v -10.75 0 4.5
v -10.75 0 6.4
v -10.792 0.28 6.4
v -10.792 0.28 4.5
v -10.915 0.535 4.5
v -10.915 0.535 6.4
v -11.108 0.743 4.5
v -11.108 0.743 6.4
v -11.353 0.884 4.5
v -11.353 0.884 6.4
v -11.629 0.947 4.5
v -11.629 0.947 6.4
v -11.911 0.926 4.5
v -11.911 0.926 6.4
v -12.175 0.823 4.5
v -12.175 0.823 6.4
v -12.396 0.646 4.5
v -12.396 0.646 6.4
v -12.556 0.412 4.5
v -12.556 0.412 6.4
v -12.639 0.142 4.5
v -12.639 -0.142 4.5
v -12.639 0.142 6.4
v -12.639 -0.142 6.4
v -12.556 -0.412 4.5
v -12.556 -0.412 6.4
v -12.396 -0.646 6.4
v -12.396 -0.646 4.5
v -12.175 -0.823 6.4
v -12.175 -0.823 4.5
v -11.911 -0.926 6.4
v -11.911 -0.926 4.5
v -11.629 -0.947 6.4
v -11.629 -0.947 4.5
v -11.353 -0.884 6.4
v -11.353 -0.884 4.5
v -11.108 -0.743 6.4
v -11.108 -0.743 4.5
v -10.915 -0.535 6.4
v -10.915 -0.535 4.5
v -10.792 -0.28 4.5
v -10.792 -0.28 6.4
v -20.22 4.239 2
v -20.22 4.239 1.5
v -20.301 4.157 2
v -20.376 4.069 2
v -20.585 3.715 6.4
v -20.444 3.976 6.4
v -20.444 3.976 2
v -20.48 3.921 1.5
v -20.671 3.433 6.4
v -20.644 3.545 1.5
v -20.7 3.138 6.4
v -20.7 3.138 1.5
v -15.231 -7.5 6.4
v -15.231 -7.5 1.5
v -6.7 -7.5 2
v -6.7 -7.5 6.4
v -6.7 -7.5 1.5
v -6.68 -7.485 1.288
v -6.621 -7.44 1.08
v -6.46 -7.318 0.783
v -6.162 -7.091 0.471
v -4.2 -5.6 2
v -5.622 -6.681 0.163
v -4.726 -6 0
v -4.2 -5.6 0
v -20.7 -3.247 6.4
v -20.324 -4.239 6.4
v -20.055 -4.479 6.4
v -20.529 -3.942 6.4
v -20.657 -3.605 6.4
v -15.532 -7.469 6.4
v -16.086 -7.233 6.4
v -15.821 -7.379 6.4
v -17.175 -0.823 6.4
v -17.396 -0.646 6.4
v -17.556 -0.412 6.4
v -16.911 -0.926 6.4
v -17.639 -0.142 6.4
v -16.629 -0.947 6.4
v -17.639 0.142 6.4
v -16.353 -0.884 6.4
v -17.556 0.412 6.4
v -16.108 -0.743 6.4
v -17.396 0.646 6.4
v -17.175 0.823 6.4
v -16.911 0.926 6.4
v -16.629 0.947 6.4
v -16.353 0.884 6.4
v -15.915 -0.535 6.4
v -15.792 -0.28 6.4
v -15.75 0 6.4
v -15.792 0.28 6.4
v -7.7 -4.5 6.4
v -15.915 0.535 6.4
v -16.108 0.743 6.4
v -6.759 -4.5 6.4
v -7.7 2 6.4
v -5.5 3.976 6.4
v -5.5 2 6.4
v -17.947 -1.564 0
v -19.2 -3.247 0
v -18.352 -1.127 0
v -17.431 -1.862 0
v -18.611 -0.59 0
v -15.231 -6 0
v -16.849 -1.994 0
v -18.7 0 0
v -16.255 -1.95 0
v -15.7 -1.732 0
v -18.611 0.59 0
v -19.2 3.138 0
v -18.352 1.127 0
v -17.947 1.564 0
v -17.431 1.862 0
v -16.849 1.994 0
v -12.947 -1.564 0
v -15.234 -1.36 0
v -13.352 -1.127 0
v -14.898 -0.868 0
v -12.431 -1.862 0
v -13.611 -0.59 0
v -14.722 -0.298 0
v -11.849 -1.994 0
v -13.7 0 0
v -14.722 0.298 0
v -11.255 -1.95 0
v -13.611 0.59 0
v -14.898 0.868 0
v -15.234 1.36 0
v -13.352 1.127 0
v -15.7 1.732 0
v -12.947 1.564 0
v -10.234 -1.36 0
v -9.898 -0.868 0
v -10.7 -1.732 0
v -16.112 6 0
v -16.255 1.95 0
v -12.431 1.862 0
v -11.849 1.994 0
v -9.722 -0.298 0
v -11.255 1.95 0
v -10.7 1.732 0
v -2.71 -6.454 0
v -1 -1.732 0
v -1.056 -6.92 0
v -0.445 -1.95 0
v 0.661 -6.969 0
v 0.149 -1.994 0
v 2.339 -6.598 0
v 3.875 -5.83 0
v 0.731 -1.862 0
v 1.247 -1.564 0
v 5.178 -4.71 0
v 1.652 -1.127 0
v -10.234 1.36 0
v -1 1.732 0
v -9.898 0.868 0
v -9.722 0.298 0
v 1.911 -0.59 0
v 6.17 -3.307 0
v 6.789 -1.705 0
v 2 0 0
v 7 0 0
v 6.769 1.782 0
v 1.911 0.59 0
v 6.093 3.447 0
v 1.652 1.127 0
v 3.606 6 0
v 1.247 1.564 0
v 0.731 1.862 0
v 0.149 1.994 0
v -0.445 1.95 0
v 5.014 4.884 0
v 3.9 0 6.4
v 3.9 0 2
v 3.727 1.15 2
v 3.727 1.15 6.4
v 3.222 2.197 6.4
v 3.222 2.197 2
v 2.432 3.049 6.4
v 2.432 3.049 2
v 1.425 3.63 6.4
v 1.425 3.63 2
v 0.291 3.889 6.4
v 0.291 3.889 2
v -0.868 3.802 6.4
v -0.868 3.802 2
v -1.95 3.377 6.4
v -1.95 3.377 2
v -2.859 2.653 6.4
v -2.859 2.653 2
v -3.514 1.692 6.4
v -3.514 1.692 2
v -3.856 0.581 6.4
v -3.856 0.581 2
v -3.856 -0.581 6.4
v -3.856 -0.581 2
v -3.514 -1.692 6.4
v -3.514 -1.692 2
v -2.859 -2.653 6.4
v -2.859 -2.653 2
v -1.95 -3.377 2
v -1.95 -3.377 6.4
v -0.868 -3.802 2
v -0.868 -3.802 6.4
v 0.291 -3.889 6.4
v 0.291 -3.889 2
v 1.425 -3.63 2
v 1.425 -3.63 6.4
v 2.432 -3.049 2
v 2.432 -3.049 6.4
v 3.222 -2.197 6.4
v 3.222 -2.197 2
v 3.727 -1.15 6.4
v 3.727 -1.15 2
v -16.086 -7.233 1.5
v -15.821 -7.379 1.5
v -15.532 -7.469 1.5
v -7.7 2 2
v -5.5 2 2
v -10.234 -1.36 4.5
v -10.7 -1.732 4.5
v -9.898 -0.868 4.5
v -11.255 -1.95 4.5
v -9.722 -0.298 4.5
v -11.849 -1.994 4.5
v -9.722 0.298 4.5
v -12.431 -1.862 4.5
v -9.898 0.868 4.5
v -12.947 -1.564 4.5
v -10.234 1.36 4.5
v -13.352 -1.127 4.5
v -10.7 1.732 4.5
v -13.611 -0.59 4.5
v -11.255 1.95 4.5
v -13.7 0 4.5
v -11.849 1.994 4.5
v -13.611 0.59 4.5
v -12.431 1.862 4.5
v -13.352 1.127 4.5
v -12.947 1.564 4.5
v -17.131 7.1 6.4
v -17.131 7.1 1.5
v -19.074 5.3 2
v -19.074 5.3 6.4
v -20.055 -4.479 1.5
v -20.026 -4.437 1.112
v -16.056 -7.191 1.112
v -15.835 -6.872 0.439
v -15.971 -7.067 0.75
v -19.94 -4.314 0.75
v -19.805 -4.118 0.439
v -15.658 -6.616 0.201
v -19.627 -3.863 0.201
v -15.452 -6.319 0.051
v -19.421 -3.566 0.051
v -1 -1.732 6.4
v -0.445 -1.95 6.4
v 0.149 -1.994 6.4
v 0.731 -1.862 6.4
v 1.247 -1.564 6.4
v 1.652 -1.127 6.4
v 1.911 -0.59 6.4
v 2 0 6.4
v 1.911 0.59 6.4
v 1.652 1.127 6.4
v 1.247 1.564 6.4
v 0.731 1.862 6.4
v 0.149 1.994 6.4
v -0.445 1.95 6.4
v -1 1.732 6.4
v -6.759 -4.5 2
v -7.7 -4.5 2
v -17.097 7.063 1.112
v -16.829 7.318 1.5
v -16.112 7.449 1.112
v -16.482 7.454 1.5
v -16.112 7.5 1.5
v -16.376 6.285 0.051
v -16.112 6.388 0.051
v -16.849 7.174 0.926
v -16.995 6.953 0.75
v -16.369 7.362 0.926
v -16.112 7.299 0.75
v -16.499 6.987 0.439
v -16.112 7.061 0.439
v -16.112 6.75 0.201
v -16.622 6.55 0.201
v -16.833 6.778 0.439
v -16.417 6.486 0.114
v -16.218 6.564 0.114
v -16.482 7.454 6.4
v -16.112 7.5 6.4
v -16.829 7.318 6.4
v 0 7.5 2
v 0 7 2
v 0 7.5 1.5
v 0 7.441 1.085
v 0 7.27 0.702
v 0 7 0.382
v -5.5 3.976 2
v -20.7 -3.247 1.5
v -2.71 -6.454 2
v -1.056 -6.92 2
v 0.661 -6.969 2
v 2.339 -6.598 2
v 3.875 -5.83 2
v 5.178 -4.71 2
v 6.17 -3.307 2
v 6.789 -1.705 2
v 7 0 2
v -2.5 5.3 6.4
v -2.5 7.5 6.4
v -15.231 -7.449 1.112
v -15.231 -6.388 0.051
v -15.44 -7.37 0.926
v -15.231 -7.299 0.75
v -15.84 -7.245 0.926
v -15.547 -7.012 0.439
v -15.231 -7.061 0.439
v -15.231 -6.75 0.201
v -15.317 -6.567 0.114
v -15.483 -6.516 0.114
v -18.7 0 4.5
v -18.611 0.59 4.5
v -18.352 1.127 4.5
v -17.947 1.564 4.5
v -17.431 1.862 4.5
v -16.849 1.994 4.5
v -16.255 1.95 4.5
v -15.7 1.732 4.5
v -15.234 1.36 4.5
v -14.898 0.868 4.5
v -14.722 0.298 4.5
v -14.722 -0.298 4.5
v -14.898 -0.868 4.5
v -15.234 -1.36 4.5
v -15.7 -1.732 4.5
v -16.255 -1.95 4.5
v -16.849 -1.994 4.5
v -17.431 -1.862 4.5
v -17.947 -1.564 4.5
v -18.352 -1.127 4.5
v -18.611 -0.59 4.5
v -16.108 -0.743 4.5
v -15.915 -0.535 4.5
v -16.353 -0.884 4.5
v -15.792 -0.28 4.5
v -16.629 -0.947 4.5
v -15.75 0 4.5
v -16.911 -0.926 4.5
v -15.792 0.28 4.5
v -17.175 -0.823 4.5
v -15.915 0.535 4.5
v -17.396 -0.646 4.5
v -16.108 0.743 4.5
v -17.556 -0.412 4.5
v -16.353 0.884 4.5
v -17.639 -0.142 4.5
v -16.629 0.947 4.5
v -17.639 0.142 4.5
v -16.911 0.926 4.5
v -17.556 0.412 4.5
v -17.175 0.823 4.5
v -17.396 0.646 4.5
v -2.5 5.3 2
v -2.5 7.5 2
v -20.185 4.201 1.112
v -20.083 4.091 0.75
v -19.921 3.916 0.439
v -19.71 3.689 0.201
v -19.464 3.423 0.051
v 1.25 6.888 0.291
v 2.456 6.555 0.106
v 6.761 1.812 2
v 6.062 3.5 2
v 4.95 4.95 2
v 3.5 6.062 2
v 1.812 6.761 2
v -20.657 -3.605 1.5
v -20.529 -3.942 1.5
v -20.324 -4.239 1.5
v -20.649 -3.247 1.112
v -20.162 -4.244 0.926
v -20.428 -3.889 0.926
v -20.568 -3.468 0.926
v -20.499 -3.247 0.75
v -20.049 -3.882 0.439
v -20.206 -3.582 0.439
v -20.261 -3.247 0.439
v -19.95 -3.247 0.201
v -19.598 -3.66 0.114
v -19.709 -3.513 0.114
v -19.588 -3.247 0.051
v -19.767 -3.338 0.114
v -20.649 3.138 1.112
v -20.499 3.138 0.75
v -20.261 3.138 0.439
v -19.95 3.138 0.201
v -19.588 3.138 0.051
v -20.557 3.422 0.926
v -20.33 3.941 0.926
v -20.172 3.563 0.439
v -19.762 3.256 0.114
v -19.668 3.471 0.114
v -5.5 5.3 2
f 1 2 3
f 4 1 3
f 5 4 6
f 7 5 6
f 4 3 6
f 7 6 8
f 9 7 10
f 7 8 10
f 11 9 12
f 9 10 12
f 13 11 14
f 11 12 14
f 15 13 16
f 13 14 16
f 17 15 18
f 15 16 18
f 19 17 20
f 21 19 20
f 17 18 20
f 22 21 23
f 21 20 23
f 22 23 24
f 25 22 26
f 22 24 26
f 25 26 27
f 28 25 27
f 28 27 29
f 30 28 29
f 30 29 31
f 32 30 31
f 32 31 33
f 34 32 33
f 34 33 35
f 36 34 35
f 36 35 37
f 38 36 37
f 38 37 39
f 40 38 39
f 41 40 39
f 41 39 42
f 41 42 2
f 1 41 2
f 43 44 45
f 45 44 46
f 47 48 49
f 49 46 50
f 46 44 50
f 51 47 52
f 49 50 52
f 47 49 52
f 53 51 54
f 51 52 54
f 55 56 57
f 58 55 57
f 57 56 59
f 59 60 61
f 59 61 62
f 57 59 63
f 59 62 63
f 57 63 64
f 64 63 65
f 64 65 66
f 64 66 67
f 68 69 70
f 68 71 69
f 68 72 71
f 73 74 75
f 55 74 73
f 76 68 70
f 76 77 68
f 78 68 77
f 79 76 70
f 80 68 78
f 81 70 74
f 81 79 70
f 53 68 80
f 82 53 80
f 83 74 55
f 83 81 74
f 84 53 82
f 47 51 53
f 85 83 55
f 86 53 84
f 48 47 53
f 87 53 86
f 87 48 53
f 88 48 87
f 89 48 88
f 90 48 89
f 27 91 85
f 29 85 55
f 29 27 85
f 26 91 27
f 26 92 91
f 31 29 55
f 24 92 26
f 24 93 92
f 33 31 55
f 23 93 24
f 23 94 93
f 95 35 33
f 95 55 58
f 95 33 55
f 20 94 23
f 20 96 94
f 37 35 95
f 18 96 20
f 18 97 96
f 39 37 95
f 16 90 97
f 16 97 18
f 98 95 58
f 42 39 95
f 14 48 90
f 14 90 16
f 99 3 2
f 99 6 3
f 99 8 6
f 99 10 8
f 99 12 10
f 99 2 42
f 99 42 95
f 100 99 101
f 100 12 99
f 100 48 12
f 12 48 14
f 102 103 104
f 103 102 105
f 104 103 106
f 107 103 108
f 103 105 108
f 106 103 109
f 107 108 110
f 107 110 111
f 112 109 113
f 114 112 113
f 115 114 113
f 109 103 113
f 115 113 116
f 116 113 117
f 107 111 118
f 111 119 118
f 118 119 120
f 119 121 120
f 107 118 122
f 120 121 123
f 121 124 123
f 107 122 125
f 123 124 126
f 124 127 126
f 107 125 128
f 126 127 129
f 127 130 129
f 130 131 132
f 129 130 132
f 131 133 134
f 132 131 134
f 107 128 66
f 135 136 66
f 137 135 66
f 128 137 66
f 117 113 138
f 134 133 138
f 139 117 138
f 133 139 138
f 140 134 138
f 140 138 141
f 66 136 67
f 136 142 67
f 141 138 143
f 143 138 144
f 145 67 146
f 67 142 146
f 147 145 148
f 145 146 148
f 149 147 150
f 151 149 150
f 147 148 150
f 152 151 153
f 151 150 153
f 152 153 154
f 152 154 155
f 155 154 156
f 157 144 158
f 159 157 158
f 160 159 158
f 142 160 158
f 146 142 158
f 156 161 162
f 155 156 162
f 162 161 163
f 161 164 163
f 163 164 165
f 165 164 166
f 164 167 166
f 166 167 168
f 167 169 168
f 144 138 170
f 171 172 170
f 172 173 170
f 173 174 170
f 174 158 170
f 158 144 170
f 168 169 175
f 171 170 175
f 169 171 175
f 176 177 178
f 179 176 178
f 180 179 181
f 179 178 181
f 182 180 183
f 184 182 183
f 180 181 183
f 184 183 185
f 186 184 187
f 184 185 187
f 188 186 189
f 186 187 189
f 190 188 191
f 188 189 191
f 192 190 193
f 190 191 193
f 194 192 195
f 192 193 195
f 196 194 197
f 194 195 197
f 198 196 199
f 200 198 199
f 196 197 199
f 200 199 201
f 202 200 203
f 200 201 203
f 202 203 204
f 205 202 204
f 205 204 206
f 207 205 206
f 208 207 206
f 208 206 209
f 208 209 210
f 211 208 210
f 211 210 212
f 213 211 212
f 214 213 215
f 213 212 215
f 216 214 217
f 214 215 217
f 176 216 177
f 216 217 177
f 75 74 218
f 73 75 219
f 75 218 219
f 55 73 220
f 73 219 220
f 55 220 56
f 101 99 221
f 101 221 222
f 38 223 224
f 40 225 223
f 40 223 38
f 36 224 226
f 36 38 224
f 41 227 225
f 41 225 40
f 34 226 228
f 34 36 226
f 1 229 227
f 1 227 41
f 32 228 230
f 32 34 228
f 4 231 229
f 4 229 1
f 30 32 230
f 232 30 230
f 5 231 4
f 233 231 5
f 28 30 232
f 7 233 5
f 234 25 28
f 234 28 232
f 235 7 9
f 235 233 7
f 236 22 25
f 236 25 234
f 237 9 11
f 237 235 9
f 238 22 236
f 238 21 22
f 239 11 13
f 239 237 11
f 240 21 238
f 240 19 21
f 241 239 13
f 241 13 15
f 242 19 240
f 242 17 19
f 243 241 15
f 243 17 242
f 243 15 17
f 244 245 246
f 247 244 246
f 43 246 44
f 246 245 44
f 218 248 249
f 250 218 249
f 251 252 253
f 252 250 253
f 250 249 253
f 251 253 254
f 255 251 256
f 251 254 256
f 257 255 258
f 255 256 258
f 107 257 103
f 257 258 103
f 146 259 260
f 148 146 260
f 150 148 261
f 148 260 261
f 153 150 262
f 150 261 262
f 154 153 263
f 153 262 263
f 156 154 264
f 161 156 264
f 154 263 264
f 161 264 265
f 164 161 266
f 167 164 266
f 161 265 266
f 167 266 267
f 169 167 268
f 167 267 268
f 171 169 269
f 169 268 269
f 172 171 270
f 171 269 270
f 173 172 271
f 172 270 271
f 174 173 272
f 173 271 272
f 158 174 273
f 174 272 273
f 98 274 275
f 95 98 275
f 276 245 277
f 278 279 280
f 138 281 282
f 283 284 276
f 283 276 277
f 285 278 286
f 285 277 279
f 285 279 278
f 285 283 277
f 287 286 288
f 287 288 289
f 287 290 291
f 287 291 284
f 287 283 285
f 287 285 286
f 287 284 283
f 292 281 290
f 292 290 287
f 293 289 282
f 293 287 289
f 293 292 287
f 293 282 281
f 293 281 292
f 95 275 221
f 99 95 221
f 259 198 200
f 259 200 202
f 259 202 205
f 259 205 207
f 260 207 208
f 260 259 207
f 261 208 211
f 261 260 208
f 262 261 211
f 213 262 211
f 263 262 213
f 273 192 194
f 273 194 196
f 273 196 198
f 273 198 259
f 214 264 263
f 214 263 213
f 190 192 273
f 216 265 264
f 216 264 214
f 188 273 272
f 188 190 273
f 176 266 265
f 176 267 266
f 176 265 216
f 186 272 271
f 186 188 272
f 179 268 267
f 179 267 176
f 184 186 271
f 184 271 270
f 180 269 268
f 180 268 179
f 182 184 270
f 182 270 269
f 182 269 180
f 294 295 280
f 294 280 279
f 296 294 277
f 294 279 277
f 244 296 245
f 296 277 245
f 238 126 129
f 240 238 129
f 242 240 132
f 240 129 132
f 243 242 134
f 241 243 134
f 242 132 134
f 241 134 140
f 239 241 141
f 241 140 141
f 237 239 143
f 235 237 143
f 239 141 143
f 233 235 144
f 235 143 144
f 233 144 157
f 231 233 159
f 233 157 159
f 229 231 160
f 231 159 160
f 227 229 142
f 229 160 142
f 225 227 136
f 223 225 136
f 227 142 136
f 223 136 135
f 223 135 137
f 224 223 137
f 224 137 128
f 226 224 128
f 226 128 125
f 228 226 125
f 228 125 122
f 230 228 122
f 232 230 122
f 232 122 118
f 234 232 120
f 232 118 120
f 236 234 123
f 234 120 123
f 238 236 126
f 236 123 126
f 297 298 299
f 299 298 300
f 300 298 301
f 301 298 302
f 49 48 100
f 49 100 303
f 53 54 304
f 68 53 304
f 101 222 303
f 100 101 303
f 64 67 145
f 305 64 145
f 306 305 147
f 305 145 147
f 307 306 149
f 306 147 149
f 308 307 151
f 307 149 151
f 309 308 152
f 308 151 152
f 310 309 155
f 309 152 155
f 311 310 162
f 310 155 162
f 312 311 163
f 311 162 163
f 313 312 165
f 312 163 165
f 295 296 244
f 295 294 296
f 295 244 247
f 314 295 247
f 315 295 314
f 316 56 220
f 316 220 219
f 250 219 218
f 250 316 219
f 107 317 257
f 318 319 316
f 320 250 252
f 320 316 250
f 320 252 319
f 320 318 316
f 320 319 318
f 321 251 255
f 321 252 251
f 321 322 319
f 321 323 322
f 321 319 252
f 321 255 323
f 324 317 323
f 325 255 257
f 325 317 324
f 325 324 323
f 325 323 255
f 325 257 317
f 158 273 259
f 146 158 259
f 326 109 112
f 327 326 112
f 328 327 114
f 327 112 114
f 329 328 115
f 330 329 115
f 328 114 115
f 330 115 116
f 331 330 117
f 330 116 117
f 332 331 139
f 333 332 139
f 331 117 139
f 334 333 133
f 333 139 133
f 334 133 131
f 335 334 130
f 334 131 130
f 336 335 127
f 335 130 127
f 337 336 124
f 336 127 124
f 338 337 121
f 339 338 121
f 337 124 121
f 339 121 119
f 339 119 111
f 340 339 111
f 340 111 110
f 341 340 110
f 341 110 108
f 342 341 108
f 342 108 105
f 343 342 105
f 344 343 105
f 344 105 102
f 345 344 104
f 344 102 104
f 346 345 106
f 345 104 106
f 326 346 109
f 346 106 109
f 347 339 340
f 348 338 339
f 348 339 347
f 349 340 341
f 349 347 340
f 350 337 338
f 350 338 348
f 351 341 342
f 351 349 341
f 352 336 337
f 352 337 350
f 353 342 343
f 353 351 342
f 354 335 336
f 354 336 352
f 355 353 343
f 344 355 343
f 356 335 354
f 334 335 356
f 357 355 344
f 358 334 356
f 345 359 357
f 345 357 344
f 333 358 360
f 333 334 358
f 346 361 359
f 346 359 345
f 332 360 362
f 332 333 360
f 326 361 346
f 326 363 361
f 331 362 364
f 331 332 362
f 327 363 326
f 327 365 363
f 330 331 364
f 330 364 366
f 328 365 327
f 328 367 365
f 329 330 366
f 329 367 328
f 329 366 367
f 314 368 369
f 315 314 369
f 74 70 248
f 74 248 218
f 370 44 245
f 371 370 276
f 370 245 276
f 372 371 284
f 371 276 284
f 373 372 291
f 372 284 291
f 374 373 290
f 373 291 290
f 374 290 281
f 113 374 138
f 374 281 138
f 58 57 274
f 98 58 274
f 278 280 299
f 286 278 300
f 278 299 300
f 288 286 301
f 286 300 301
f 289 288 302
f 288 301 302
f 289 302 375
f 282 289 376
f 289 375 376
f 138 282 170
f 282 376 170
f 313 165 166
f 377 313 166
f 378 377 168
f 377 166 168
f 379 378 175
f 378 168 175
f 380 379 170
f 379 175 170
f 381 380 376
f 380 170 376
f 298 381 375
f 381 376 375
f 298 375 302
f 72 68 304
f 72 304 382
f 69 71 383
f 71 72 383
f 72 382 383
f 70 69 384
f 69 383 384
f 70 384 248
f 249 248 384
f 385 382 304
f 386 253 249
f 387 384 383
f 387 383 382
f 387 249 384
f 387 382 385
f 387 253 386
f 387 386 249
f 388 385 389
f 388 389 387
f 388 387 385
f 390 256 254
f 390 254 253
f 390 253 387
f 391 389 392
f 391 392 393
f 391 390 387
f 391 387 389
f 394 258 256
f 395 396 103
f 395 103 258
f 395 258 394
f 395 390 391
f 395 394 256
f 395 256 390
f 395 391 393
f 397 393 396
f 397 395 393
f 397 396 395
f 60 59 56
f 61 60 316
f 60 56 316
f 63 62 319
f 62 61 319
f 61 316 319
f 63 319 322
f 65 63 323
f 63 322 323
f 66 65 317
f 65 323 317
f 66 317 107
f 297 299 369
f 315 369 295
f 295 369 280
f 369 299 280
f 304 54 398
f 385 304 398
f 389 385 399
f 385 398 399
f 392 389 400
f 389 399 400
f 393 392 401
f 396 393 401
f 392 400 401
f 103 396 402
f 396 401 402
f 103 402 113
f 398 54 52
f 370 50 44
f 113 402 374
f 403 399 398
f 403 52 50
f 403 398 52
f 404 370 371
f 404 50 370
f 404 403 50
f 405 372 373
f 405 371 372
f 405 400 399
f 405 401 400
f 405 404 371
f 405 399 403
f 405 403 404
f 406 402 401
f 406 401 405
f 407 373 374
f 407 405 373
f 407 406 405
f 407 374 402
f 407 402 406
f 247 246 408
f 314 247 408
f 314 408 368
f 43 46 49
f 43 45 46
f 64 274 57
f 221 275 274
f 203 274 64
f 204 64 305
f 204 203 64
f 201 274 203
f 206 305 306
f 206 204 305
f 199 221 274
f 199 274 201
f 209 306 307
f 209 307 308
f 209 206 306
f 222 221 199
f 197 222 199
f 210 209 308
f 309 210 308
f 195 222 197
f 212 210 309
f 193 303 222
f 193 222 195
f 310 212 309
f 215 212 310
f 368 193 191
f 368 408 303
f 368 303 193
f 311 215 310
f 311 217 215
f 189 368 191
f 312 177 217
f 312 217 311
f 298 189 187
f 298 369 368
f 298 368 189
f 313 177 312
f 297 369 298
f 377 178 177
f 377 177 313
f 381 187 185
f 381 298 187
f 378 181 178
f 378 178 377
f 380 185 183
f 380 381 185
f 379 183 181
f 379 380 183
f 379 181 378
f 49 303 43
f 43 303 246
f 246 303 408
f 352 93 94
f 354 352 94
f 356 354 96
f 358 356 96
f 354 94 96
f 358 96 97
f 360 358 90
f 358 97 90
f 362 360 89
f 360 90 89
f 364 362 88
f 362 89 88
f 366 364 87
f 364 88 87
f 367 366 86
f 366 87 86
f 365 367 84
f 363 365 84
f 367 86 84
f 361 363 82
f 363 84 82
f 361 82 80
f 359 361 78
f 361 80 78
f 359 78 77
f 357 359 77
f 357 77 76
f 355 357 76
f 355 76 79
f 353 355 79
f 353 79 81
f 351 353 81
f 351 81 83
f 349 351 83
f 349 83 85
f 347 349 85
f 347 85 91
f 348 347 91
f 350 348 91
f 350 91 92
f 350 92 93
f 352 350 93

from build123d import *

# Parameters (mm, degrees)
BOSS_EXTRUDE1_DEPTH      = 2
BOSS_EXTRUDE2_DEPTH      = 8
SKETCH24_R               = 3.9
BOSS_EXTRUDE5_DEPTH      = 4.4
SKETCH30_W               = 4.40861202
SKETCH30_H               = 1.324178481
CUT_EXTRUDE12_DEPTH      = 16
CUT_EXTRUDE11_DEPTH      = 23.928148639
FILLET1_R                = 1.5
SKETCH34_R               = 0.75
CUT_EXTRUDE13_DEPTH      = 8
SKETCH35_R               = 0.75
CUT_EXTRUDE14_DEPTH      = 3
CUT_EXTRUDE14_DEPTH_BACK = 8
SKETCH36_R               = 0.95
CUT_EXTRUDE15_DEPTH      = 8
SKETCH37_R               = 2
CUT_EXTRUDE16_DEPTH      = 4.5
SKETCH38_W               = 3
SKETCH38_H               = 1.25
CUT_EXTRUDE17_DEPTH      = 3.6


with BuildPart() as part:
    # Sketch2 → Boss-Extrude1 (new body)
    with BuildSketch(Plane.XY):
        with BuildLine():
            Line((-2.5, 7.5), (-16.7, 7.5))
            Line((-16.7, 7.5), (-20.7, 3.793442666))
            Line((-20.7, 3.793442666), (-20.7, -4.031648778))
            Line((-20.7, -4.031648778), (-15.7, -7.5))
            Line((-15.7, -7.5), (-6.7, -7.5))
            Line((-6.7, -7.5), (-4.2, -5.6))
            ThreePointArc((-4.2, -5.6), (3.130495168, -6.260990337), (7, 0))
            ThreePointArc((7, 0), (4.949747468, 4.949747468), (0, 7))
            Line((0, 7), (0, 7.5))
            Line((0, 7.5), (-2.5, 7.5))
        make_face()
    extrude(amount=BOSS_EXTRUDE1_DEPTH)

    # Sketch4 → Boss-Extrude2 (add)
    with BuildSketch(Plane.XY.offset(2)):
        Polygon((-15.7, -7.5), (-6.7, -7.5), (-6.759079174, -4.5), (-7.7, -4.5), (-7.7, 2), (-5.5, 2), (-5.5, 5.3), (-2.5, 5.3), (-2.5, 7.5), (-16.7, 7.5), (-20.7, 3.793442666), (-20.7, -4.031648778), align=None)
    extrude(amount=BOSS_EXTRUDE2_DEPTH)

    # Sketch24 → Boss-Extrude5 (add)
    with BuildSketch(Plane.XY.offset(2)):
        Circle(SKETCH24_R)
    extrude(amount=BOSS_EXTRUDE5_DEPTH)

    # Sketch30 → Cut-Extrude12 (cut)
    with BuildSketch(Plane(origin=(-5.5, 0, 0), x_dir=(0, 0, -1), z_dir=(1, 0, 0))):
        with Locations((-4.20430601, 4.63791076)):
            Rectangle(SKETCH30_W, SKETCH30_H)
    extrude(amount=-CUT_EXTRUDE12_DEPTH, mode=Mode.SUBTRACT)

    # Sketch28 → Cut-Extrude11 (cut, through all)
    with BuildSketch(Plane.XY.offset(6.4)):
        with BuildLine():
            Line((-1, 1.732050808), (-1, -1.732050808))
            ThreePointArc((-1, -1.732050808), (2, 0), (-1, 1.732050808))
        make_face()
    extrude(amount=-CUT_EXTRUDE11_DEPTH, mode=Mode.SUBTRACT)

    # Fillet1
    # the kernel refuses this fillet: 1.5 mm, written as the material it takes off along each edge
    with BuildSketch(Plane(origin=(-15.230677435, -6, 1.5), x_dir=(-0.5699665637840448, -0.8216678867816415, 0), z_dir=(0, 0, -1))) as fillet1_piece_1_section:
        Polygon((0, 0), (FILLET1_R * 1.02, 0), (FILLET1_R * 1.02, -FILLET1_R * 0.319139344377), (FILLET1_R * 0.838101244517, -FILLET1_R * 0.58136589506), align=None)
    fillet1_piece_1 = extrude(amount=FILLET1_R * 1.02, mode=Mode.PRIVATE)
    fillet1_piece_1 = fillet1_piece_1 - Plane(origin=(-15.230677435, -6, 1.5), x_dir=(0.29860685961507855, 0.9543762064253388, 0), z_dir=(0, 0, -1)) * Sphere(FILLET1_R, mode=Mode.PRIVATE)
    add(fillet1_piece_1, mode=Mode.SUBTRACT)
    with BuildSketch(Plane(origin=(-16.11186344, 6, 1.5), x_dir=(-0.6796897201843015, 0.7334997506991983, 0), z_dir=(0, 0, -1))) as fillet1_piece_2_section:
        Polygon((0, 0), (FILLET1_R * 1.02, 0), (FILLET1_R * 1.02, FILLET1_R * 0.399932860855), (FILLET1_R * 0.748169745713, FILLET1_R * 0.693283514588), align=None)
    fillet1_piece_2 = extrude(amount=FILLET1_R * 1.02, mode=Mode.PRIVATE)
    fillet1_piece_2 = fillet1_piece_2 - Plane(origin=(-16.11186344, 6, 1.5), x_dir=(0.3650344157067945, -0.9309940254102596, 0), z_dir=(0, 0, -1)) * Sphere(FILLET1_R, mode=Mode.PRIVATE)
    add(fillet1_piece_2, mode=Mode.SUBTRACT)
    with BuildSketch(Plane(origin=(-19.2, 3.138411196, 1.5), x_dir=(-0.6796897201843015, 0.7334997506991983, 0), z_dir=(0, 0, -1))) as fillet1_piece_3_section:
        Polygon((0, 0), (FILLET1_R * 1.02, 0), (FILLET1_R * 1.02, -FILLET1_R * 0.445421399395), (FILLET1_R * 0.693283514588, -FILLET1_R * 0.748169745713), align=None)
    fillet1_piece_3 = extrude(amount=FILLET1_R * 1.02, mode=Mode.PRIVATE)
    fillet1_piece_3 = fillet1_piece_3 - Plane(origin=(-19.2, 3.138411196, 1.5), x_dir=(0.9164304993244992, -0.40019387789901173, 0), z_dir=(0, 0, -1)) * Sphere(FILLET1_R, mode=Mode.PRIVATE)
    add(fillet1_piece_3, mode=Mode.SUBTRACT)
    with BuildSketch(Plane(origin=(-19.2, -3.246599046, 1.5), x_dir=(-0.5699665637840448, -0.8216678867816415, 0), z_dir=(0, 0, -1))) as fillet1_piece_4_section:
        Polygon((0, 0), (FILLET1_R * 1.02, 0), (FILLET1_R * 1.02, FILLET1_R * 0.533833817771), (FILLET1_R * 0.58136589506, FILLET1_R * 0.838101244517), align=None)
    fillet1_piece_4 = extrude(amount=FILLET1_R * 1.02, mode=Mode.PRIVATE)
    fillet1_piece_4 = fillet1_piece_4 - Plane(origin=(-19.2, -3.246599046, 1.5), x_dir=(0.8859928227090906, 0.46369895202380795, 0), z_dir=(0, 0, -1)) * Sphere(FILLET1_R, mode=Mode.PRIVATE)
    add(fillet1_piece_4, mode=Mode.SUBTRACT)
    with BuildSketch(Plane(origin=(-15.230677435, -7.5, 0), x_dir=(0, 1, 0), z_dir=(1, 0, 0))) as fillet1_piece_5_section:
        with BuildLine():
            CenterArc((FILLET1_R, FILLET1_R), FILLET1_R, 180, 90)
            Line((0, FILLET1_R), (0, 0))
            Line((0, 0), (FILLET1_R, 0))
        make_face()
    fillet1_piece_5 = extrude(amount=12.280677435, mode=Mode.PRIVATE)
    fillet1_piece_5 = split(fillet1_piece_5, bisect_by=Plane(origin=(-9.092127217, -9.318016685, 0.3282266), z_dir=(-0.6050832675335577, 0.7961621941231027, 0)), keep=Keep.TOP, mode=Mode.PRIVATE)
    add(fillet1_piece_5, mode=Mode.SUBTRACT)
    with BuildSketch(Plane(origin=(3.75, 7.5, 0), x_dir=(0, 0, 1), z_dir=(-1, 0, 0))) as fillet1_piece_6:
        with BuildLine():
            CenterArc((FILLET1_R, -FILLET1_R), FILLET1_R, 90, 90)
            Line((0, -FILLET1_R), (0, 0))
            Line((0, 0), (FILLET1_R, 0))
        make_face()
    extrude(amount=19.86186344, mode=Mode.SUBTRACT)
    with BuildSketch(Plane(origin=(-17.13139802, 7.100249626, 0), x_dir=(0.6796897201843014, -0.7334997506991981, 0), z_dir=(-0.7334997506991983, -0.6796897201843015, 0))) as fillet1_piece_7:
        with BuildLine():
            CenterArc((FILLET1_R, FILLET1_R), FILLET1_R, 180, 90)
            Line((0, FILLET1_R), (0, 0))
            Line((0, 0), (FILLET1_R, 0))
        make_face()
    extrude(amount=4.21013989, mode=Mode.SUBTRACT)
    with BuildSketch(Plane(origin=(-20.054949846, -4.479100876, 0), x_dir=(0.5699665637840448, 0.8216678867816416, 0), z_dir=(0.8216678867816415, -0.5699665637840448, 0))) as fillet1_piece_8:
        with BuildLine():
            CenterArc((FILLET1_R, FILLET1_R), FILLET1_R, 180, 90)
            Line((0, FILLET1_R), (0, 0))
            Line((0, 0), (FILLET1_R, 0))
        make_face()
    extrude(amount=4.830811364, mode=Mode.SUBTRACT)
    with BuildSketch(Plane(origin=(-20.7, 3.138411196, 0), x_dir=(1, 0, 0), z_dir=(0, -1, 0))) as fillet1_piece_9:
        with BuildLine():
            CenterArc((FILLET1_R, FILLET1_R), FILLET1_R, 180, 90)
            Line((0, FILLET1_R), (0, 0))
            Line((0, 0), (FILLET1_R, 0))
        make_face()
    extrude(amount=6.385010242, mode=Mode.SUBTRACT)
    with BuildSketch(Plane(origin=(-15.7, -7.5, 1.5), x_dir=(1, 0, 0), z_dir=(0, 0, 1))) as fillet1_piece_10:
        with BuildLine():
            CenterArc((FILLET1_R * 0.312881710173, FILLET1_R), FILLET1_R, 235.252105822, 34.747894178)
            Line((-FILLET1_R * 0.257084853611, FILLET1_R * 0.178332113218), (0, 0))
            Line((0, 0), (FILLET1_R * 0.312881710173, 0))
        make_face()
    extrude(amount=9.673306413, mode=Mode.SUBTRACT)
    with BuildSketch(Plane(origin=(-20.7, -4.031648778, 1.5), x_dir=(0, 1, 0), z_dir=(0, 0, 1))) as fillet1_piece_11:
        with BuildLine():
            CenterArc((FILLET1_R * 0.523366488011, -FILLET1_R), FILLET1_R, 90, 55.252105822)
            Line((-FILLET1_R * 0.298301398771, -FILLET1_R * 0.430033436216), (0, 0))
            Line((0, 0), (FILLET1_R * 0.523366488011, 0))
        make_face()
    extrude(amount=10.46262433, mode=Mode.SUBTRACT)
    with BuildSketch(Plane(origin=(-20.7, 3.793442666, 1.5), x_dir=(0.7334997506991984, 0.6796897201843014, 0), z_dir=(0, 0, 1))) as fillet1_piece_12:
        with BuildLine():
            CenterArc((FILLET1_R * 0.436687646465, -FILLET1_R), FILLET1_R, 90, 47.18059856)
            Line((-FILLET1_R * 0.296812104234, -FILLET1_R * 0.320310279816), (0, 0))
            Line((0, 0), (FILLET1_R * 0.436687646465, 0))
        make_face()
    extrude(amount=10.137578674, mode=Mode.SUBTRACT)
    with BuildSketch(Plane(origin=(-16.7, 7.5, 1.5), x_dir=(1, 0, 0), z_dir=(0, 0, 1))) as fillet1_piece_13:
        with BuildLine():
            CenterArc((FILLET1_R * 0.392091040054, -FILLET1_R), FILLET1_R, 90, 42.81940144)
            Line((-FILLET1_R * 0.287598680131, -FILLET1_R * 0.266500249301), (0, 0))
            Line((0, 0), (FILLET1_R * 0.392091040054, 0))
        make_face()
    extrude(amount=9.9703414, mode=Mode.SUBTRACT)

    # Sketch34 → Cut-Extrude13 (cut, along a direction that is not the sketch's normal)
    with BuildSketch(Plane.XZ.offset(-2)):
        with Locations((-7, 10)):
            Circle(SKETCH34_R)
    extrude(amount=-CUT_EXTRUDE13_DEPTH, dir=(0.6685833876565112, -0.7436371788377336, 0), mode=Mode.SUBTRACT)

    # Sketch35 → Cut-Extrude14 (cut, two sides, along a direction that is not the sketch's normal)
    with BuildSketch(Plane(origin=(0, -4.5, 0), x_dir=(1, 0, 0), z_dir=(0, 1, 0))) as cut_extrude14_sk:
        with Locations((-8.259079174, -10)):
            Circle(SKETCH35_R)
    extrude(amount=CUT_EXTRUDE14_DEPTH, dir=(0.5999194182208608, 0.8000604299935998, 0), mode=Mode.SUBTRACT)
    extrude(cut_extrude14_sk.sketch, amount=-CUT_EXTRUDE14_DEPTH_BACK, dir=(0.5999194182208608, 0.8000604299935998, 0), mode=Mode.SUBTRACT)

    # Sketch36 → Cut-Extrude15 (cut)
    with BuildSketch(Plane.XY.offset(10)):
        with Locations((-11.7, 0)):
            Circle(SKETCH36_R)
        with Locations((-16.7, 0)):
            Circle(SKETCH36_R)
    extrude(amount=-CUT_EXTRUDE15_DEPTH, mode=Mode.SUBTRACT)

    # Sketch37 → Cut-Extrude16 (cut)
    with BuildSketch(Plane(origin=(0, 0, 0), x_dir=(-1, 0, 0), z_dir=(0, 0, -1))):
        with Locations((11.7, 0)):
            Circle(SKETCH37_R)
        with Locations((16.7, 0)):
            Circle(SKETCH37_R)
    extrude(amount=-CUT_EXTRUDE16_DEPTH, mode=Mode.SUBTRACT)

    # Sketch38 → Cut-Extrude17 (cut)
    with BuildSketch(Plane.XY.offset(10)):
        with Locations((-4, 5.925)):
            Rectangle(SKETCH38_W, SKETCH38_H)
    extrude(amount=-CUT_EXTRUDE17_DEPTH, mode=Mode.SUBTRACT)


with BuildPart() as body_2:
    # Split1: the piece on the far side of the plane
    add(part.part)
    split(bisect_by=Plane.XY.offset(6.4), keep=Keep.BOTTOM)


with BuildPart() as part_1:
    add(part.part)

    # Split1
    split(bisect_by=Plane.XY.offset(6.4), keep=Keep.TOP)


solid = body_2.part
